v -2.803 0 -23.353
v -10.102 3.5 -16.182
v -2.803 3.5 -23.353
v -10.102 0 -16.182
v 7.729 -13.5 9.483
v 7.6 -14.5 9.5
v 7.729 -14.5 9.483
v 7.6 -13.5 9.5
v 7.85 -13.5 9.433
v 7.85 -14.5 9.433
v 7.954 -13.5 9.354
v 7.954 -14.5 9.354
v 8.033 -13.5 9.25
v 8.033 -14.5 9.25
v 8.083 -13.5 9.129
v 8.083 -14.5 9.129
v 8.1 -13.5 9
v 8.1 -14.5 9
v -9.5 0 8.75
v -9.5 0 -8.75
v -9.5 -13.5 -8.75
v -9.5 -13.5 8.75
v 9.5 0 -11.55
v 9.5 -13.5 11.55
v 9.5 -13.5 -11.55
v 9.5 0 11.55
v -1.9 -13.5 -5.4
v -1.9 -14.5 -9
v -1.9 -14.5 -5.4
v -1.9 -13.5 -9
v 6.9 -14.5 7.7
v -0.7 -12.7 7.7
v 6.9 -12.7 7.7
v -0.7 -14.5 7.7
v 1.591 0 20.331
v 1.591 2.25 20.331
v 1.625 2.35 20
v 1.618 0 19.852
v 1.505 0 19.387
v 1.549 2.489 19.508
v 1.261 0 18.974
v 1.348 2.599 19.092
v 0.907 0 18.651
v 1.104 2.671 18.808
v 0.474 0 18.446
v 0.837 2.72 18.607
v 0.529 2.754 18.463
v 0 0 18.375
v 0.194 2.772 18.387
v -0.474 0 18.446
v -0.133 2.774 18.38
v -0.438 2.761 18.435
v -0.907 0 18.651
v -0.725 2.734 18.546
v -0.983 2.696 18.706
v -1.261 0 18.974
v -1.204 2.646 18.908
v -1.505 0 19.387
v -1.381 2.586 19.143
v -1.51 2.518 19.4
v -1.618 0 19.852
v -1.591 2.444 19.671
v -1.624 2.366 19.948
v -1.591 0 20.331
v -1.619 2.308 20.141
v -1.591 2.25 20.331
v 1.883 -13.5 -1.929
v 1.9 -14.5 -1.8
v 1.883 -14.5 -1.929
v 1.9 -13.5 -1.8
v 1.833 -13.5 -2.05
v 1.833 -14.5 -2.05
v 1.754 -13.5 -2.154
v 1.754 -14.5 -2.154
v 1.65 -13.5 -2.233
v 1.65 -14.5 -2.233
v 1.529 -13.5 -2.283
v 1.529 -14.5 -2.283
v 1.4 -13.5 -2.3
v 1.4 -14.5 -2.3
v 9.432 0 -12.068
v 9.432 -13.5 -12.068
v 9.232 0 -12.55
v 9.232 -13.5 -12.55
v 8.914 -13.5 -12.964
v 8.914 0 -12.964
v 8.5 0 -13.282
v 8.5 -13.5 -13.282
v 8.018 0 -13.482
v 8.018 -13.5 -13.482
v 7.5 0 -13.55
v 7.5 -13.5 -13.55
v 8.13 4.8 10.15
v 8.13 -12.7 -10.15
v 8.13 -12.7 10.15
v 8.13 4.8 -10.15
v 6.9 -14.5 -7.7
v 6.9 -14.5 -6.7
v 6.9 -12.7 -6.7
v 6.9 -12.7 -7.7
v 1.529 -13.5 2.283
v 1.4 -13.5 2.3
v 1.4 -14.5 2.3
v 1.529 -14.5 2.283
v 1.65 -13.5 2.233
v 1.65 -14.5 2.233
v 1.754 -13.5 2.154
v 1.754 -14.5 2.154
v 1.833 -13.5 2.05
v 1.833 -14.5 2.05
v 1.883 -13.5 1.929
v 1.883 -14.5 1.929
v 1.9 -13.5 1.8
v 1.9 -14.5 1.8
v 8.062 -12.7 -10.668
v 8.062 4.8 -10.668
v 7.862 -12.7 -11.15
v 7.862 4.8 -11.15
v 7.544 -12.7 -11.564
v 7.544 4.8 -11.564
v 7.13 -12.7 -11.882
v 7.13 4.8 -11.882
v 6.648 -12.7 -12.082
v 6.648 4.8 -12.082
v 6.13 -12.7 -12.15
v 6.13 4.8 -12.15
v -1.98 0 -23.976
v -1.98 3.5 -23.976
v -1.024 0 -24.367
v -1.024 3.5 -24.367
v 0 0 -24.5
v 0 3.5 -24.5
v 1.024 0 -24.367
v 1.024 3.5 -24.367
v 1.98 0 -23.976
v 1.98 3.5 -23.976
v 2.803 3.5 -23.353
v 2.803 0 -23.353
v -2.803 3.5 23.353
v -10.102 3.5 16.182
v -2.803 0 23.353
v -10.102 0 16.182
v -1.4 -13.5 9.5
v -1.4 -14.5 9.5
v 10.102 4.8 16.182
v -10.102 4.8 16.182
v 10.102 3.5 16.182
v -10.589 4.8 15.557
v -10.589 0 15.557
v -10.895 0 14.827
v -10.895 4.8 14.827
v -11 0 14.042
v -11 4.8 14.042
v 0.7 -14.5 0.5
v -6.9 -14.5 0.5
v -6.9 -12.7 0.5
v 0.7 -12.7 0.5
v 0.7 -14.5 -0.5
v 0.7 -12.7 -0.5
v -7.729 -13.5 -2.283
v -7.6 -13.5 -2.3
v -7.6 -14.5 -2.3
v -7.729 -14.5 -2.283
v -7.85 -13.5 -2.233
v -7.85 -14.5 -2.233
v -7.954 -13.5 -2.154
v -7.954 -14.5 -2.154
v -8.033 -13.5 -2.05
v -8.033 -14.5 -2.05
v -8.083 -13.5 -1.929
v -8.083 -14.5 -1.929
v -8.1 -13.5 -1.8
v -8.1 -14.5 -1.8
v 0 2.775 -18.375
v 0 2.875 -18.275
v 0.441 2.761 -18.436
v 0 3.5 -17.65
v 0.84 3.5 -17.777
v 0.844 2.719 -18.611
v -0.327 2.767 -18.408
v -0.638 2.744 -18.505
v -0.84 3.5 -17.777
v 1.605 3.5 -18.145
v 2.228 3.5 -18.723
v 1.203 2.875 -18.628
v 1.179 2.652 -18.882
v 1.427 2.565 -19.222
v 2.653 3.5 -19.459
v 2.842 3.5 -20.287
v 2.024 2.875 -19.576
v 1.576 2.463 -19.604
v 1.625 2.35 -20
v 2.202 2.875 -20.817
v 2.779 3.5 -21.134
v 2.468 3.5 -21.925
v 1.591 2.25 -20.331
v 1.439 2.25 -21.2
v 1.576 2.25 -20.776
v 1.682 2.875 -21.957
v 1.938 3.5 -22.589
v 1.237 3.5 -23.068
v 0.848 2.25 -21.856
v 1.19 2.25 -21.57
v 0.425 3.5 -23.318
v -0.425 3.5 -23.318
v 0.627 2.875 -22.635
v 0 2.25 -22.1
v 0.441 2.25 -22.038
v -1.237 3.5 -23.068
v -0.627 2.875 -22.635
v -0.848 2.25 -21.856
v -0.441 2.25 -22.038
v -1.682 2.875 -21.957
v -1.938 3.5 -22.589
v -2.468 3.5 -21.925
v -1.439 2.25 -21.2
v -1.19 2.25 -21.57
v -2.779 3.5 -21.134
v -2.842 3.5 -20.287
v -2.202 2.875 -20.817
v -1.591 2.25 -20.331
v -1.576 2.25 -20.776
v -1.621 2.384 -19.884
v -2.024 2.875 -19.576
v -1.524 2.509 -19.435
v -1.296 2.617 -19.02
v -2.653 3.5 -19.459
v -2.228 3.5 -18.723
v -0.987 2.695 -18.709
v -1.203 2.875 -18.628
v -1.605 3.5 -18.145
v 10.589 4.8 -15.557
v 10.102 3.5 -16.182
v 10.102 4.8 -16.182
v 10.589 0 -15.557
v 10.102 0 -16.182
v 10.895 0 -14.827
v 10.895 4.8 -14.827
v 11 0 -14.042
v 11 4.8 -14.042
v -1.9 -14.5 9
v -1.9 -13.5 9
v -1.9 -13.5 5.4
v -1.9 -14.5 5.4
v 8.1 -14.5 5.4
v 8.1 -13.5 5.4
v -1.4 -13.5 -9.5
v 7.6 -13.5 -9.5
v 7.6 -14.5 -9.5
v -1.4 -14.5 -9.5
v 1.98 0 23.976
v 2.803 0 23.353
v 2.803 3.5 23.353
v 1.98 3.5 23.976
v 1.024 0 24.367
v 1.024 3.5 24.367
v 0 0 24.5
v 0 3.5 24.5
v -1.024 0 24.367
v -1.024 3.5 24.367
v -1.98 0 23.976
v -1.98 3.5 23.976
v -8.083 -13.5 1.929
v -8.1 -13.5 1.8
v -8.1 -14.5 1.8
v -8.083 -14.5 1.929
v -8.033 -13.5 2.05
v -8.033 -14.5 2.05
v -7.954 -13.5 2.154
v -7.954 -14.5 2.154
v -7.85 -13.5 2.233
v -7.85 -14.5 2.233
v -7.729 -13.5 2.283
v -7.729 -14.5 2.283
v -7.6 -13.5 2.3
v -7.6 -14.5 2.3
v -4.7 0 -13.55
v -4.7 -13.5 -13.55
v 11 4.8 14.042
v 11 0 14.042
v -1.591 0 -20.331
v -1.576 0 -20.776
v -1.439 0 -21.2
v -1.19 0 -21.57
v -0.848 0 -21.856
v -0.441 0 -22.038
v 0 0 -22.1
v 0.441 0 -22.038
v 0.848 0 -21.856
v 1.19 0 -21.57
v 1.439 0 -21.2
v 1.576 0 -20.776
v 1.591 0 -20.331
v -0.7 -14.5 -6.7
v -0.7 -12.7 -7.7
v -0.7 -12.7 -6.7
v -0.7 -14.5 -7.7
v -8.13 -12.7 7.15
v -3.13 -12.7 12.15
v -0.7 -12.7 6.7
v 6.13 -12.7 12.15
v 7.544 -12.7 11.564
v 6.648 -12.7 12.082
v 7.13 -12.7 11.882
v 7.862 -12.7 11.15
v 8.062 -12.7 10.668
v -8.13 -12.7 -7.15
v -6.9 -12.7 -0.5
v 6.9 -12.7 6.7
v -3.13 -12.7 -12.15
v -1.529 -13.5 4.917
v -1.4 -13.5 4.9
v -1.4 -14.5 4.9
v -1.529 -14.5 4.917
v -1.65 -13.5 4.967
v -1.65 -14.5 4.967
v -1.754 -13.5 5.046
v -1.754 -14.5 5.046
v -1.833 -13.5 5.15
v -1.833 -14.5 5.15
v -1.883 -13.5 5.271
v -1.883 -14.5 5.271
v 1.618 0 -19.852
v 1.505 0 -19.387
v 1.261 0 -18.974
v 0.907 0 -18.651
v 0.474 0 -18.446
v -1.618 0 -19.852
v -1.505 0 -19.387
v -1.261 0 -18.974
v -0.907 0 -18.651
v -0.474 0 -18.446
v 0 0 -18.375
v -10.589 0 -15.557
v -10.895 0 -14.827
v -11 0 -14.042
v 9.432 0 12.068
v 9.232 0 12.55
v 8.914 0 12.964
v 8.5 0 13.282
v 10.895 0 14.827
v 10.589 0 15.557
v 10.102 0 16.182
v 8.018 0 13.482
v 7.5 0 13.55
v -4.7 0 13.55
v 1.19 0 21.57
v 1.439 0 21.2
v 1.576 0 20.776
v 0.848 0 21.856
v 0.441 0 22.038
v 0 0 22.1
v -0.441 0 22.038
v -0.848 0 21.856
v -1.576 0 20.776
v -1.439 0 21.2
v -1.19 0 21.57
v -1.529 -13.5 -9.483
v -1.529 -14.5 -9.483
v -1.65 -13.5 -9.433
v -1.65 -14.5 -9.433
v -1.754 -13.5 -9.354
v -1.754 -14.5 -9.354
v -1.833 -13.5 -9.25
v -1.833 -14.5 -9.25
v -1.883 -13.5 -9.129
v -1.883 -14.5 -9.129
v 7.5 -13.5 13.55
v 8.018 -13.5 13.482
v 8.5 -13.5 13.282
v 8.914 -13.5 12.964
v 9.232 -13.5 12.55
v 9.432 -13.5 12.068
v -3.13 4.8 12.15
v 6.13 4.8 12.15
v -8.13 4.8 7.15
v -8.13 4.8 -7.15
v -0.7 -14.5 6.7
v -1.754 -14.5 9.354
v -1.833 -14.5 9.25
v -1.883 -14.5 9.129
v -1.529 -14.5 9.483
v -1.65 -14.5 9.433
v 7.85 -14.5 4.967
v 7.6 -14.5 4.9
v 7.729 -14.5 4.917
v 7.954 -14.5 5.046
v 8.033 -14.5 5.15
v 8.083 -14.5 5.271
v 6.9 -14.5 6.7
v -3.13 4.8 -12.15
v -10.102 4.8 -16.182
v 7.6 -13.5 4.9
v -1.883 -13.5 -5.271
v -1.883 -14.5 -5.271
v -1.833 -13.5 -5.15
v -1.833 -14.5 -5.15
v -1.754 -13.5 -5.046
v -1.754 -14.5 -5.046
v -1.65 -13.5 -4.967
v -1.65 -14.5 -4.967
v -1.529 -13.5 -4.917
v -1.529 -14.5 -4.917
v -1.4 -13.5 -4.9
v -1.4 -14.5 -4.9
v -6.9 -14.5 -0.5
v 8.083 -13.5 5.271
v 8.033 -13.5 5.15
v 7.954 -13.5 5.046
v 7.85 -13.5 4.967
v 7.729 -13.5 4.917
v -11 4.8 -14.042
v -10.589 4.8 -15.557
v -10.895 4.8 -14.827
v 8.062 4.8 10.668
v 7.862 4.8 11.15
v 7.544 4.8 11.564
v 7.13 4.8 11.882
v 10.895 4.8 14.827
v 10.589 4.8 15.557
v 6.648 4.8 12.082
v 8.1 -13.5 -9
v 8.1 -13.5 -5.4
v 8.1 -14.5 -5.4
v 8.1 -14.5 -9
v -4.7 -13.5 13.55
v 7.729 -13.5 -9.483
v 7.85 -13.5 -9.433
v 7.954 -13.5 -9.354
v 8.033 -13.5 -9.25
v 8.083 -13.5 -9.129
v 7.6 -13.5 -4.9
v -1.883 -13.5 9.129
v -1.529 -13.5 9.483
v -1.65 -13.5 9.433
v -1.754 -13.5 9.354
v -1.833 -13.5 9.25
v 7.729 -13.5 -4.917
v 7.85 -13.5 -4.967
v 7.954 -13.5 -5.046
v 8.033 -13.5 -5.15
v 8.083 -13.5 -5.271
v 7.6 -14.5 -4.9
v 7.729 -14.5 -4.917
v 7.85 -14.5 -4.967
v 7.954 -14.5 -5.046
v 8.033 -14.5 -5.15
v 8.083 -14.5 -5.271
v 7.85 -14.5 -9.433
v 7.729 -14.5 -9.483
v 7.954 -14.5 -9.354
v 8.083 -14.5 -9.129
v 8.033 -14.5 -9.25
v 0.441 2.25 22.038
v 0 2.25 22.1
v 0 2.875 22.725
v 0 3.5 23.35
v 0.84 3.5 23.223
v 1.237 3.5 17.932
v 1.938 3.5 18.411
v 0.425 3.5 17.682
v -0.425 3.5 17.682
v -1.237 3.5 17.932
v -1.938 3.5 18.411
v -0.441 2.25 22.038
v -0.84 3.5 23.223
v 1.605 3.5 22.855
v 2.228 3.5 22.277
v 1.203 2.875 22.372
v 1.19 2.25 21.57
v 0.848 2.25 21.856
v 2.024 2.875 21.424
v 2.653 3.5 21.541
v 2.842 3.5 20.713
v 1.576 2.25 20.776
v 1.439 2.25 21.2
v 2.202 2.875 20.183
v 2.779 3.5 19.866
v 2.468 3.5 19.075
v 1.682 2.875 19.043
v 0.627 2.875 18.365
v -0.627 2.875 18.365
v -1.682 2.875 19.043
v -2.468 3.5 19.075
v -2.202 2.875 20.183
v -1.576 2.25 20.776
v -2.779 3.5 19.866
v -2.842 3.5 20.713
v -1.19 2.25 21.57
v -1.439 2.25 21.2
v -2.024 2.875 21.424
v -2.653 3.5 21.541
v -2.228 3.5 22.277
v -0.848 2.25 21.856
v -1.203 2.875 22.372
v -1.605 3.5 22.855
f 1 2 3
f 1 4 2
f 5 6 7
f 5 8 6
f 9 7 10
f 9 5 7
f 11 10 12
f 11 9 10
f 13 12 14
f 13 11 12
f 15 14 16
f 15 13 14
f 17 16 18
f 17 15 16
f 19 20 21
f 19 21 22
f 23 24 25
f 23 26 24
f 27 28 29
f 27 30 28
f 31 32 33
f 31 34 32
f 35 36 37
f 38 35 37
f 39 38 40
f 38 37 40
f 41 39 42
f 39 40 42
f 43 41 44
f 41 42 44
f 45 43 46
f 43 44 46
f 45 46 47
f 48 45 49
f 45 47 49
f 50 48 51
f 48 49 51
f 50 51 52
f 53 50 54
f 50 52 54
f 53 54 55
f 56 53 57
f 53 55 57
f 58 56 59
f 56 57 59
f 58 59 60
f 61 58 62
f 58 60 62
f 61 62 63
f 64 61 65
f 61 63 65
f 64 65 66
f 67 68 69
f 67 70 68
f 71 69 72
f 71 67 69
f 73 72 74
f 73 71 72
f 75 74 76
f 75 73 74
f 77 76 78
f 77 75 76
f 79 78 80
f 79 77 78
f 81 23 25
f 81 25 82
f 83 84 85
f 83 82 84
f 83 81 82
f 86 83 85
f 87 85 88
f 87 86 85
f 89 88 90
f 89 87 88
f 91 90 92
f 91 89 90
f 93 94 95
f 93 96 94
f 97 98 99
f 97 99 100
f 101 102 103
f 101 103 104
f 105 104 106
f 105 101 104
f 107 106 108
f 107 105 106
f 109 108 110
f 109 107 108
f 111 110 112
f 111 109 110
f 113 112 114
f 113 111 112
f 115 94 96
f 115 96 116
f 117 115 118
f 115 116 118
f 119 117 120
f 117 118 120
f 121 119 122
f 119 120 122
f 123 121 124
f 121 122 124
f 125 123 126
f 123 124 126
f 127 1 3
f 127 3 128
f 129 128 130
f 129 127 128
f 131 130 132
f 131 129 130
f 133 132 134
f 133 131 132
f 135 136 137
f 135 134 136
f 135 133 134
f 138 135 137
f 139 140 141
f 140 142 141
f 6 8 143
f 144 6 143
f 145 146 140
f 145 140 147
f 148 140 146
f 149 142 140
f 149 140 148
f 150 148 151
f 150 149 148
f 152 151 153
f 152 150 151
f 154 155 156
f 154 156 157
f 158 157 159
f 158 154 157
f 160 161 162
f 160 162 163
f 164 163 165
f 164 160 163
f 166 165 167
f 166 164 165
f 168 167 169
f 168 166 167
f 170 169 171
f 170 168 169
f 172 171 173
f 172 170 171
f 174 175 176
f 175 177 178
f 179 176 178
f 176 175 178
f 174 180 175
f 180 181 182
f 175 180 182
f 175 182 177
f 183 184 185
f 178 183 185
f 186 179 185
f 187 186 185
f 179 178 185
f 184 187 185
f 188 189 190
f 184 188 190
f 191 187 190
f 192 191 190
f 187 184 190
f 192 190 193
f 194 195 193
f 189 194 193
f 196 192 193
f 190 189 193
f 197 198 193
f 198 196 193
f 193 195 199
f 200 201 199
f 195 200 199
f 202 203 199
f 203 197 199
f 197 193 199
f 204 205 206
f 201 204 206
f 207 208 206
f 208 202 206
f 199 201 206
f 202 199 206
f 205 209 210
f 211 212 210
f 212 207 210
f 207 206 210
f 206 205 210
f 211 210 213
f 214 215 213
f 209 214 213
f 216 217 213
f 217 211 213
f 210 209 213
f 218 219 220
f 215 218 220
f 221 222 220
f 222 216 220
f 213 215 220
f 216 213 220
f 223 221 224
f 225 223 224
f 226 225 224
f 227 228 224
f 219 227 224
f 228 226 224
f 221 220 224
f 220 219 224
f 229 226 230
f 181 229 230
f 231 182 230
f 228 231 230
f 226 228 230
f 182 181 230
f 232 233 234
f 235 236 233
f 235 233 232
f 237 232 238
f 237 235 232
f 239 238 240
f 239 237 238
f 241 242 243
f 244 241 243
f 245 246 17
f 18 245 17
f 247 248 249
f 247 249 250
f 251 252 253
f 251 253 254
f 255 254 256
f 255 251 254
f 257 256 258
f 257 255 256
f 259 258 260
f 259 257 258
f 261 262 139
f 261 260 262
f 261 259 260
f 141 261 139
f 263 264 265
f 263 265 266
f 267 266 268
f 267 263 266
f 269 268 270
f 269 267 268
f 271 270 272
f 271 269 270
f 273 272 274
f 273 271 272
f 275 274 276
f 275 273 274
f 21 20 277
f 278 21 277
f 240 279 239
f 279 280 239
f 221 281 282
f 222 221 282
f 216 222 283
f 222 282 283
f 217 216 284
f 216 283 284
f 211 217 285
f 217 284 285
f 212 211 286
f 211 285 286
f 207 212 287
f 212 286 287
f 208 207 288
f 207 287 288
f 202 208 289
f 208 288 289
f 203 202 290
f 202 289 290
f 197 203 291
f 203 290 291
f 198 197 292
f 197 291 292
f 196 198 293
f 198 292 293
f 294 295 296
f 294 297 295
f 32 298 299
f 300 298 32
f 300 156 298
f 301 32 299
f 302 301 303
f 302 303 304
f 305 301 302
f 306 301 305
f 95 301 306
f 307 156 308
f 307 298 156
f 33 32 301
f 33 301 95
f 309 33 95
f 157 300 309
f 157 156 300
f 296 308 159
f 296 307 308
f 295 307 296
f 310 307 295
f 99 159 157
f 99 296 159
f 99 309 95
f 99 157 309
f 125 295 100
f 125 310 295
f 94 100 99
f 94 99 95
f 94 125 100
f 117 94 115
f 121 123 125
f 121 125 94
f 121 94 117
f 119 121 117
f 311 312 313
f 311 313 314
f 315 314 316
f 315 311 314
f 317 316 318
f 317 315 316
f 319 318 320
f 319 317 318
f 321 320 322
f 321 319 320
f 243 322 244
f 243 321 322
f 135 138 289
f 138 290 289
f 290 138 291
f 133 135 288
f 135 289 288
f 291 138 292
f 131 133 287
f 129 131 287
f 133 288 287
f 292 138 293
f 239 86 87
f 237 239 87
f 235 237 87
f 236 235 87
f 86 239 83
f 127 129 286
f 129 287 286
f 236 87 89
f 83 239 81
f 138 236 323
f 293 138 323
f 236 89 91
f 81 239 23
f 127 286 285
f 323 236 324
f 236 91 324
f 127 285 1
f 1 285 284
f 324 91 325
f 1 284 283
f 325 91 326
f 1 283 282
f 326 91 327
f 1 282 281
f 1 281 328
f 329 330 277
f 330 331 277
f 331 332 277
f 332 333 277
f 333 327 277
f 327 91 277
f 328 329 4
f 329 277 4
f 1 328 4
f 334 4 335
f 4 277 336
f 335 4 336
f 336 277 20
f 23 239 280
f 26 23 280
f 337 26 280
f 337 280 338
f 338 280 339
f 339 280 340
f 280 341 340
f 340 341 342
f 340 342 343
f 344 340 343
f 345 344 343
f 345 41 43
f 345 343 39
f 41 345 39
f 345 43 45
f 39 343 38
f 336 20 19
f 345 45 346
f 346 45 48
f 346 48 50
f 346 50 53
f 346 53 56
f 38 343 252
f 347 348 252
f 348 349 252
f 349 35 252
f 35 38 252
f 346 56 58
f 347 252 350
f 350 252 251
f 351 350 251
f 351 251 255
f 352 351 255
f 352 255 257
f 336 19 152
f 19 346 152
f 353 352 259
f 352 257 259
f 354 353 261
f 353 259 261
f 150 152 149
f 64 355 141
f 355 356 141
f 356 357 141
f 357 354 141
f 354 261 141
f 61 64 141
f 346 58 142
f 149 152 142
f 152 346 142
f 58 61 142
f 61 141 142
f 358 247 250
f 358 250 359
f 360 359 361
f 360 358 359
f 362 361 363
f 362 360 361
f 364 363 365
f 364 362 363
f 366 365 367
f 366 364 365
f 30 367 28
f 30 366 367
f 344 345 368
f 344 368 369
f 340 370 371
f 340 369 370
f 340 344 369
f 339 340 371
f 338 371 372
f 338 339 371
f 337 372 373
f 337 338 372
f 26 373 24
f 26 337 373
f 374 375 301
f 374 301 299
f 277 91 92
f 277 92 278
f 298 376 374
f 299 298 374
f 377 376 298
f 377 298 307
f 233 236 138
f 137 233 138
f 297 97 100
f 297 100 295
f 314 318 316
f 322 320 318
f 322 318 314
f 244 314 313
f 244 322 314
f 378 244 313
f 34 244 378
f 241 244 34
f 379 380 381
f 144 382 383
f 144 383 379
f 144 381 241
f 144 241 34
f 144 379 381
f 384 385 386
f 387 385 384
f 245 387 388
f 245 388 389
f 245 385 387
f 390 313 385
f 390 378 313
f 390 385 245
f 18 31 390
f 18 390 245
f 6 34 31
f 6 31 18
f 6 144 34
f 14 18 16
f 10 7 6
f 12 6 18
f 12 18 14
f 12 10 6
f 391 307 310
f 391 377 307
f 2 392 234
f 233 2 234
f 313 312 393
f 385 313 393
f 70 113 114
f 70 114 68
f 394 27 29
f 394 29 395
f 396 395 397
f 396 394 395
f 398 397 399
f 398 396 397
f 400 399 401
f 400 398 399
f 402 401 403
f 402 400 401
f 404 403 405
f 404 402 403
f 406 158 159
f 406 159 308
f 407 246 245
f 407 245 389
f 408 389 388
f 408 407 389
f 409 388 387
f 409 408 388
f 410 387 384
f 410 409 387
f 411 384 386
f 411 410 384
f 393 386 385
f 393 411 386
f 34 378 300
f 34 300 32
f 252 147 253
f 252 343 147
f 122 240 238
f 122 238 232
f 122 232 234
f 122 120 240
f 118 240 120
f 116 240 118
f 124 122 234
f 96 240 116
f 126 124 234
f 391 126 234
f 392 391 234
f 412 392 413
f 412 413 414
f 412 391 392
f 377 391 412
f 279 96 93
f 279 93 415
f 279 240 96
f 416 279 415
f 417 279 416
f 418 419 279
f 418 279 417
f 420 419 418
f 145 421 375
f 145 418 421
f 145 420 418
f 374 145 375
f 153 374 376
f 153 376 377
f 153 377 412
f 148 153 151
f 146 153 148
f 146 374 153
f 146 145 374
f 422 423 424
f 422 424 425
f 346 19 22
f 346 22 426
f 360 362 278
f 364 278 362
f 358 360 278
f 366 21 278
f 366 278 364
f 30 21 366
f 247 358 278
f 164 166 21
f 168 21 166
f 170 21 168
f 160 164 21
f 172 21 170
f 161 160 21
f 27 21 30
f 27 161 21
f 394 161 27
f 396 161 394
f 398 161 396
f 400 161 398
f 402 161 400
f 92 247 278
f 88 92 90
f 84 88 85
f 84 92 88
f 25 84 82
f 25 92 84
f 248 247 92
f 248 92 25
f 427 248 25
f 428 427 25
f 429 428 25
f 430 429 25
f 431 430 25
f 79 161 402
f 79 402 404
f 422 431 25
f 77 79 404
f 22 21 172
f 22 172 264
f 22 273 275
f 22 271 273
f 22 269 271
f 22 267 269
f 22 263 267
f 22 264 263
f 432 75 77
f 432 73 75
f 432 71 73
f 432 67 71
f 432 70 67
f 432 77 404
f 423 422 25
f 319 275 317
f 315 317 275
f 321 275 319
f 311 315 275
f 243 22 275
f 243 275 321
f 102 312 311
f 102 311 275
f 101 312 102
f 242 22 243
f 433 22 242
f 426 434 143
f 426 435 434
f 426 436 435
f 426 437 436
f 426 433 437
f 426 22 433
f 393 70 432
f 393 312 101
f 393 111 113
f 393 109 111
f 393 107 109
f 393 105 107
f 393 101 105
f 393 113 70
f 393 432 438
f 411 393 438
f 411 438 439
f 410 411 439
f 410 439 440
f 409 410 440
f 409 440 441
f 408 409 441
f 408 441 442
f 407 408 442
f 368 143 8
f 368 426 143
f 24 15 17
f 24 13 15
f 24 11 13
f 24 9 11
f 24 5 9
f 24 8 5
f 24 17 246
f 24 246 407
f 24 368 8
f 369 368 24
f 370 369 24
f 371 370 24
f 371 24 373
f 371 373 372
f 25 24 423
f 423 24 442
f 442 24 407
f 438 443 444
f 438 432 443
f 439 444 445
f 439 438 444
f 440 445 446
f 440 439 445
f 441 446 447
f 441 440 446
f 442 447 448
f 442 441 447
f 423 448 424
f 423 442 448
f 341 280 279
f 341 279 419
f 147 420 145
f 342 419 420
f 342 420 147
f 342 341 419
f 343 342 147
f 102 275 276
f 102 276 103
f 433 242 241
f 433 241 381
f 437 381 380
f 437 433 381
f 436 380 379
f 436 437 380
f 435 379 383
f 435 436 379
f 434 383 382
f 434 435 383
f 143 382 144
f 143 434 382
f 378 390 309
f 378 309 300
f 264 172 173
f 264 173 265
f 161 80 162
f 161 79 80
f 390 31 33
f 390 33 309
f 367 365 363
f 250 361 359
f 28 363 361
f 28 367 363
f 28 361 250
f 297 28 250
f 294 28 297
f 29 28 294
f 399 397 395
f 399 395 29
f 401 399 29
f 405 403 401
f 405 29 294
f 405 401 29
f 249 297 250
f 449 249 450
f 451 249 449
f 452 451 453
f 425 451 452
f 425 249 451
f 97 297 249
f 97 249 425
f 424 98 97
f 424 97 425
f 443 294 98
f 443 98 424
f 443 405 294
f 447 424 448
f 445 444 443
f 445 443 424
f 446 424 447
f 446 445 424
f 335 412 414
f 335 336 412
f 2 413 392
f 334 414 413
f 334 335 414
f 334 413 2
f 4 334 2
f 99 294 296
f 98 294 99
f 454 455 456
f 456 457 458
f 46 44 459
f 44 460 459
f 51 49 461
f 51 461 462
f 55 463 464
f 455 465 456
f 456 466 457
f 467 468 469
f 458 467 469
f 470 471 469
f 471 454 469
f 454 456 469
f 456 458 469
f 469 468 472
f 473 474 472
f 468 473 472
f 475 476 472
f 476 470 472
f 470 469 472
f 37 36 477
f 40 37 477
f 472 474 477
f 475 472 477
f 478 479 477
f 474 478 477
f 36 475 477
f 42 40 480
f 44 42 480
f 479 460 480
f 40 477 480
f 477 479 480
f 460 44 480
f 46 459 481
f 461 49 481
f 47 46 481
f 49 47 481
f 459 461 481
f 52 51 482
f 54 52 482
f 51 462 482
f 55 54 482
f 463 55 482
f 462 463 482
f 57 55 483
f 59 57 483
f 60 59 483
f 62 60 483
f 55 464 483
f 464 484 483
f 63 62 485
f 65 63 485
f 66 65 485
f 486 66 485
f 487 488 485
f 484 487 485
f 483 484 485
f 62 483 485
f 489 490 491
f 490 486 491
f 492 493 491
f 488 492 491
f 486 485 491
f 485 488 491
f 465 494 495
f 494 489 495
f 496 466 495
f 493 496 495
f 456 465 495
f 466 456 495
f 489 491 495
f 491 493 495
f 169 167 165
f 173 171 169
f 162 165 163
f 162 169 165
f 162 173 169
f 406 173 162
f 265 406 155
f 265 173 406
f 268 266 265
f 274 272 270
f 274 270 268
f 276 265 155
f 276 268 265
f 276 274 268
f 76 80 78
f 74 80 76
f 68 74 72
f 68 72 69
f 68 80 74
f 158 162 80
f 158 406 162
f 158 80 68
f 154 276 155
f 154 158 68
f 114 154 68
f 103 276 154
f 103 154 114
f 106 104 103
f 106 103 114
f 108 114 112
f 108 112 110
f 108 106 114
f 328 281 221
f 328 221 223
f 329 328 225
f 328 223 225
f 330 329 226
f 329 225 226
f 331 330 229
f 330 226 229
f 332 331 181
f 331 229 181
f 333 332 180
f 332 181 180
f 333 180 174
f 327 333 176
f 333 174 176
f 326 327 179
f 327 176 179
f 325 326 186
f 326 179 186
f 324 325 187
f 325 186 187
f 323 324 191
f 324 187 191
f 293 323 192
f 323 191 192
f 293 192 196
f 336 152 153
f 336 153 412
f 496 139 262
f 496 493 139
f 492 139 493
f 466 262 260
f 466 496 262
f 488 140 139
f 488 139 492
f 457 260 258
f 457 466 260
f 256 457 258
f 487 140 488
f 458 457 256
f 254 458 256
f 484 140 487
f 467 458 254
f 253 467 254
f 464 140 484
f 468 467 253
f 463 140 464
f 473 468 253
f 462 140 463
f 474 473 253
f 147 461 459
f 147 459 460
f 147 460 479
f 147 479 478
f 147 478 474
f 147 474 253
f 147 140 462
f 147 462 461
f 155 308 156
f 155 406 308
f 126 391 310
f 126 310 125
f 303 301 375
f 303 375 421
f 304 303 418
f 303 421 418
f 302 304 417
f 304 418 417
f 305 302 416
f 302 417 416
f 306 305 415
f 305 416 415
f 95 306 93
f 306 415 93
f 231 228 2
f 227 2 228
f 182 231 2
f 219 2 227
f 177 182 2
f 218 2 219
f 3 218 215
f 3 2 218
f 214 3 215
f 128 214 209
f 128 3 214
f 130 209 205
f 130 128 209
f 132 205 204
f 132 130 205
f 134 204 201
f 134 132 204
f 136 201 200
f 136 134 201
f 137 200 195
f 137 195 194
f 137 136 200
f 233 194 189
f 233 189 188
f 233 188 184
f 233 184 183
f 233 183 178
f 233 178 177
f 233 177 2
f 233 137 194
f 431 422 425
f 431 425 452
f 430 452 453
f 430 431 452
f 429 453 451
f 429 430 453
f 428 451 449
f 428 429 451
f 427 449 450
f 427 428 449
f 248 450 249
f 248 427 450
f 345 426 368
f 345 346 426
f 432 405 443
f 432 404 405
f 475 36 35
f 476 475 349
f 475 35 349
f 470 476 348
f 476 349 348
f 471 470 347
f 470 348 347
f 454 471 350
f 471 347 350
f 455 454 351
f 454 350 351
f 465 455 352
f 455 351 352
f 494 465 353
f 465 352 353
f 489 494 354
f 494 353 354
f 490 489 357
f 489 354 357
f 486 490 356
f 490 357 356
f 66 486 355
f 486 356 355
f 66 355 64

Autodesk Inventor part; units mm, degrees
ref_plane "YZ Plane" through (0, 0, 0) normal (1, 0, 0) x (0, 1, 0)
ref_plane "XZ Plane" through (0, 0, 0) normal (0, 1, 0) x (-1, 0, 0)
ref_plane "XY Plane" through (0, 0, 0) normal (0, 0, 1) x (1, 0, 0)
sketch "Sketch1" plane through (0, 0, 0) normal (0, 1, 0) x (-1, 0, 0)
  arc A0 (2.8034, 23.3533) -> (-2.8034, 23.3533) centre (0, 20.5) ccw
  line L0 (-11, 14.0418) -> (-11, 0)
  line L1 (11, 14.0418) -> (11, 0)
  line L2 (11, 0) -> (-11, 0)
  line L3 (10.1025, 16.1818) -> (2.8034, 23.3533)
  line L4 (-10.1025, 16.1818) -> (-2.8034, 23.3533)
  arc A1 (11, 14.0418) -> (10.1025, 16.1818) centre (8, 14.0418) ccw
  arc A2 (-10.1025, 16.1818) -> (-11, 14.0418) centre (-8, 14.0418) ccw
  arc A3 (-2.8034, -23.3533) -> (2.8034, -23.3533) centre (0, -20.5) ccw
  line L5 (-11, -14.0418) -> (-11, 0)
  line L6 (11, -14.0418) -> (11, 0)
  line L7 (10.1025, -16.1818) -> (2.8034, -23.3533)
  line L8 (-10.1025, -16.1818) -> (-2.8034, -23.3533)
  arc A4 (10.1025, -16.1818) -> (11, -14.0418) centre (8, -14.0418) ccw
  arc A5 (-11, -14.0418) -> (-10.1025, -16.1818) centre (-8, -14.0418) ccw
  point P0 (0, 0)
  point P1 (11, 15.3)
  point P2 (-11, 15.3)
  point P3 (11, -15.3)
  point P4 (-11, -15.3)
  dimension "d0" = 0
  dimension "d1" = 22
  dimension "d2" = 11
  dimension "d3" = 8
  dimension "d4" = 15.3
  dimension "d5" = 0
  dimension "d6" = 15.3
  dimension "d7" = 20.5
  dimension "d8" = 3
extrude "Extrusion1" add sketch "Sketch1" along normal blind 4.8
sketch "Sketch2" plane through (0, 4.8, 0) normal (0, 1, 0) x (1, 0, 0)
  line L0 (-10.1025, -16.1818) -> (-2.8034, -23.3533) projected
  line L1 (2.8034, -23.3533) -> (10.1025, -16.1818) projected
  line L2 (-10.1025, -16.1818) -> (10.1025, -16.1818)
  line L3 (-2.8034, 23.3533) -> (-10.1025, 16.1818) projected
  line L4 (10.1025, 16.1818) -> (2.8034, 23.3533) projected
  line L5 (-10.1025, 16.1818) -> (10.1025, 16.1818)
  arc A0 (-2.8034, -23.3533) -> (2.8034, -23.3533) centre (0, -20.5) ccw projected
  arc A1 (2.8034, 23.3533) -> (-2.8034, 23.3533) centre (0, 20.5) ccw projected
  point P0 (0, 0)
extrude "Extrusion2" cut sketch "Sketch2" against normal blind 1.3
sketch "Sketch3" plane through (0, 3.5, 0) normal (0, 1, 0) x (1, 0, 0)
  arc A0 (-2.8034, -23.3533) -> (2.8034, -23.3533) centre (0, -20.5) ccw projected
  point P0 (0, 0)
  point P1 (0, 20.5)
hole "Hole1" at (0, 3.5, 20.5) at (0, 3.5, -20.5) direction (0, -1, 0) diameter 3.2 depth 8 tip angle 118 countersink diameter 5.7 countersink angle 90
sketch "Sketch5" plane through (0, 0, 0) normal (0, -1, 0) x (1, 0, 0)
  line L0 (7.5, -13.55) -> (-4.7, -13.55)
  line L1 (-9.5, -8.75) -> (-9.5, 8.75)
  line L2 (-4.7, 13.55) -> (7.5, 13.55)
  line L3 (9.5, 11.55) -> (9.5, -11.55)
  line L4 (9.5, -13.55) -> (-9.5, 13.55) construction
  line L5 (-9.5, -13.55) -> (9.5, 13.55) construction
  line L6 (-9.5, -8.75) -> (-4.7, -13.55)
  line L7 (-9.5, 8.75) -> (-4.7, 13.55)
  arc A0 (7.5, -13.55) -> (9.5, -11.55) centre (7.5, -11.55) ccw
  arc A1 (9.5, 11.55) -> (7.5, 13.55) centre (7.5, 11.55) ccw
  point P0 (0, 0)
  dimension "d20" = 4.8
  dimension "d21" = 4.8
  dimension "d22" = 4.8
  dimension "d23" = 4.8
  dimension "d24" = 19
  dimension "d25" = 2
  dimension "d26" = 27.1
extrude "Extrusion3" add sketch "Sketch5" along normal blind 13.5
sketch "Sketch6" plane through (0, 4.8, 0) normal (0, 1, 0) x (1, 0, 0)
  line L0 (6.13, -12.15) -> (-3.13, -12.15)
  line L1 (-8.13, -7.15) -> (-8.13, 7.15)
  line L2 (-3.13, 12.15) -> (6.13, 12.15)
  line L3 (8.13, 10.15) -> (8.13, -10.15)
  line L4 (8.13, -12.15) -> (-8.13, 12.15) construction
  line L5 (-8.13, -12.15) -> (8.13, 12.15) construction
  arc A0 (6.13, -12.15) -> (8.13, -10.15) centre (6.13, -10.15) ccw
  arc A1 (8.13, 10.15) -> (6.13, 12.15) centre (6.13, 10.15) ccw
  line L6 (-8.13, -7.15) -> (-3.13, -12.15)
  line L7 (-8.13, 7.15) -> (-3.13, 12.15)
  point P0 (0, 0)
  dimension "d29" = 2
  dimension "d30" = 24.3
  dimension "d31" = 16.26
  dimension "d32" = 5
  dimension "d33" = 45
  dimension "d34" = 5
  dimension "d35" = 45
extrude "Extrusion4" cut sketch "Sketch6" against normal blind 17.5
sketch "Sketch7" plane through (0, -13.5, 0) normal (0, -1, 0) x (1, 0, 0)
  line L0 (1.4, -2.3) -> (-7.6, -2.3)
  line L1 (-8.1, -1.8) -> (-8.1, 1.8)
  line L2 (-7.6, 2.3) -> (1.4, 2.3)
  line L3 (1.9, 1.8) -> (1.9, -1.8)
  line L4 (1.9, -2.3) -> (-8.1, 2.3) construction
  line L5 (-8.1, -2.3) -> (1.9, 2.3) construction
  line L6 (7.6, -9.5) -> (-1.4, -9.5)
  line L7 (-1.9, -9) -> (-1.9, -5.4)
  line L8 (-1.4, -4.9) -> (7.6, -4.9)
  line L9 (8.1, -5.4) -> (8.1, -9)
  line L10 (8.1, -9.5) -> (-1.9, -4.9) construction
  line L11 (-1.9, -9.5) -> (8.1, -4.9) construction
  line L12 (-9.5, -8.75) -> (-4.7, -13.55) projected
  line L13 (-4.7, -13.55) -> (7.5, -13.55) projected
  arc A0 (7.5, -13.55) -> (9.5, -11.55) centre (7.5, -11.55) ccw projected
  line L14 (9.5, -11.55) -> (9.5, 11.55) projected
  arc A1 (9.5, 11.55) -> (7.5, 13.55) centre (7.5, 11.55) ccw projected
  line L15 (7.5, 13.55) -> (-4.7, 13.55) projected
  line L16 (-4.7, 13.55) -> (-9.5, 8.75) projected
  line L17 (-9.5, 8.75) -> (-9.5, -8.75) projected
  line L18 (-9.5, 0) -> (9.5, 0)
  arc A2 (-8.1, -1.8) -> (-7.6, -2.3) centre (-7.6, -1.8) ccw
  arc A3 (-7.6, 2.3) -> (-8.1, 1.8) centre (-7.6, 1.8) ccw
  arc A4 (1.9, 1.8) -> (1.4, 2.3) centre (1.4, 1.8) ccw
  arc A5 (1.4, -2.3) -> (1.9, -1.8) centre (1.4, -1.8) ccw
  arc A6 (-1.4, -4.9) -> (-1.9, -5.4) centre (-1.4, -5.4) ccw
  arc A7 (8.1, -5.4) -> (7.6, -4.9) centre (7.6, -5.4) ccw
  arc A8 (7.6, -9.5) -> (8.1, -9) centre (7.6, -9) ccw
  arc A9 (-1.9, -9) -> (-1.4, -9.5) centre (-1.4, -9) ccw
  line L19 (7.6, 9.5) -> (-1.4, 9.5)
  line L20 (-1.9, 9) -> (-1.9, 5.4)
  line L21 (-1.4, 4.9) -> (7.6, 4.9)
  line L22 (8.1, 5.4) -> (8.1, 9)
  line L23 (8.1, 9.5) -> (-1.9, 4.9) construction
  line L24 (-1.9, 9.5) -> (8.1, 4.9) construction
  arc A10 (-1.9, 5.4) -> (-1.4, 4.9) centre (-1.4, 5.4) ccw
  arc A11 (7.6, 4.9) -> (8.1, 5.4) centre (7.6, 5.4) ccw
  arc A12 (8.1, 9) -> (7.6, 9.5) centre (7.6, 9) ccw
  arc A13 (-1.4, 9.5) -> (-1.9, 9) centre (-1.4, 9) ccw
  point P0 (0, 0)
  point P1 (-3.1, 0)
  point P2 (3.1, -7.2)
  point P3 (3.1, 7.2)
  dimension "d38" = 10
  dimension "d39" = 4.6
  dimension "d40" = 2.6
  dimension "d41" = 10
  dimension "d42" = 4.6
  dimension "d43" = 0.5
  dimension "d44" = 1.4
  dimension "d45" = 1.4
extrude "Extrusion5" add sketch "Sketch7" along normal blind 1 contours L0 A2 L1 L18 L3 A5 | L18 L1 A3 L2 A4 L3 | L6 A9 L7 A6 L8 A7 L9 A8 | A12 L22 A11 L21 A10 L20 A13 L19
sketch "Sketch8" plane through (0, -14.5, 0) normal (0, -1, 0) x (1, 0, 0)
  line L0 (-7.6, -2.3) -> (1.4, -2.3) projected
  arc A0 (1.4, -2.3) -> (1.9, -1.8) centre (1.4, -1.8) ccw projected
  line L1 (1.9, -1.8) -> (1.9, 1.8) projected
  arc A1 (1.9, 1.8) -> (1.4, 2.3) centre (1.4, 1.8) ccw projected
  line L2 (1.4, 2.3) -> (-7.6, 2.3) projected
  arc A2 (-7.6, 2.3) -> (-8.1, 1.8) centre (-7.6, 1.8) ccw projected
  line L3 (-8.1, 1.8) -> (-8.1, -1.8) projected
  arc A3 (-8.1, -1.8) -> (-7.6, -2.3) centre (-7.6, -1.8) ccw projected
  line L4 (7.6, -4.9) -> (-1.4, -4.9) projected
  arc A4 (-1.4, -4.9) -> (-1.9, -5.4) centre (-1.4, -5.4) ccw projected
  line L5 (-1.9, -5.4) -> (-1.9, -9) projected
  arc A5 (-1.9, -9) -> (-1.4, -9.5) centre (-1.4, -9) ccw projected
  line L6 (-1.4, -9.5) -> (7.6, -9.5) projected
  arc A6 (7.6, -9.5) -> (8.1, -9) centre (7.6, -9) ccw projected
  line L7 (8.1, -9) -> (8.1, -5.4) projected
  arc A7 (8.1, -5.4) -> (7.6, -4.9) centre (7.6, -5.4) ccw projected
  line L8 (-1.9, 9) -> (-1.9, 5.4) projected
  arc A8 (-1.9, 5.4) -> (-1.4, 4.9) centre (-1.4, 5.4) ccw projected
  line L9 (-1.4, 4.9) -> (7.6, 4.9) projected
  arc A9 (7.6, 4.9) -> (8.1, 5.4) centre (7.6, 5.4) ccw projected
  line L10 (8.1, 5.4) -> (8.1, 9) projected
  arc A10 (8.1, 9) -> (7.6, 9.5) centre (7.6, 9) ccw projected
  line L11 (7.6, 9.5) -> (-1.4, 9.5) projected
  arc A11 (-1.4, 9.5) -> (-1.9, 9) centre (-1.4, 9) ccw projected
  line L12 (-8.1, 1.8) -> (-8.1, -1.8) projected
  line L13 (-8.1, 0) -> (1.9, 0)
  line L14 (-7.6, -2.3) -> (1.4, -2.3) projected
  line L15 (-3.1, -2.3) -> (-3.1, 2.3)
  line L16 (-1.9, -5.4) -> (-1.9, -9) projected
  line L17 (-1.9, -7.2) -> (8.1, -7.2)
  line L18 (7.6, -9.5) -> (-1.4, -9.5) projected
  line L19 (3.1, -9.5) -> (3.1, -4.9)
  line L20 (7.6, -4.9) -> (-1.4, -4.9) projected
  line L21 (3.1, 4.9) -> (3.1, 9.5)
  line L22 (-1.9, 9) -> (-1.9, 5.4) projected
  line L23 (-1.9, 7.2) -> (8.1, 7.2)
  line L24 (6.9, -7.7) -> (-0.7, -7.7)
  line L25 (-0.7, -7.7) -> (-0.7, -6.7)
  line L26 (-0.7, -6.7) -> (6.9, -6.7)
  line L27 (6.9, -6.7) -> (6.9, -7.7)
  line L28 (6.9, -7.7) -> (-0.7, -6.7) construction
  line L29 (-0.7, -7.7) -> (6.9, -6.7) construction
  line L30 (0.7, -0.5) -> (-6.9, -0.5)
  line L31 (-6.9, -0.5) -> (-6.9, 0.5)
  line L32 (-6.9, 0.5) -> (0.7, 0.5)
  line L33 (0.7, 0.5) -> (0.7, -0.5)
  line L34 (0.7, -0.5) -> (-6.9, 0.5) construction
  line L35 (-6.9, -0.5) -> (0.7, 0.5) construction
  line L36 (6.9, 6.7) -> (-0.7, 6.7)
  line L37 (-0.7, 6.7) -> (-0.7, 7.7)
  line L38 (-0.7, 7.7) -> (6.9, 7.7)
  line L39 (6.9, 7.7) -> (6.9, 6.7)
  line L40 (6.9, 6.7) -> (-0.7, 7.7) construction
  line L41 (-0.7, 6.7) -> (6.9, 7.7) construction
  point P0 (0, 0)
  point P1 (3.1, -7.2)
  point P2 (-3.1, 0)
  point P3 (3.1, 7.2)
  dimension "d48" = 7.6
  dimension "d49" = 7.6
  dimension "d50" = 7.6
  dimension "d52" = 1
  dimension "d53" = 1
  dimension "d54" = 1
extrude "Extrusion6" cut sketch "Sketch8" against normal through all contours L30 L31 L13 L15 | L15 L13 L33 L30 | L15 L32 L33 L13 | L13 L31 L32 L15 | L26 L27 L17 L19 | L19 L17 L25 L26 | L19 L24 L25 L17 | L17 L27 L24 L19 | L37 L38 L21 L23 | L23 L21 L36 L37 | L23 L39 L36 L21 | L21 L38 L39 L23
sketch "Sketch9" plane through (0, 3.5, 0) normal (0, 1, 0) x (1, 0, 0)
  circle A0 centre (0, 20.5) radius 1.6 projected
  circle A1 centre (0, 20.5) radius 0.2629
  circle A2 centre (0, 20) radius 1.625
  line L0 (0, 20) -> (0, -20)
  circle A3 centre (0, -20) radius 1.625
  point P0 (0, 0)
  point P1 (-1.591, 20.3306)
  point P2 (1.591, 20.3306)
  dimension "d57" = 3.25
  dimension "d58" = 0.5
  dimension "d61" = 40
  dimension "d62" = 3.25
extrude "Extrusion7" cut sketch "Sketch9" against normal blind 10 contours A3 | A0 L0 A2 | A2 L0 A0
equation "\"d2\" = 0.5 * d1"
equation "\"d6\" = d4"
equation "\"d21\" = d20"
equation "\"d22\" = d20"
equation "\"d23\" = d22"
equation "\"d34\" = d32"
equation "\"d35\" = d33"
equation "\"d42\" = d39"
equation "\"d49\" = d48"
equation "\"d50\" = d48"
equation "\"d53\" = d52"
equation "\"d54\" = d52"
properties part number "PlugFemeaTomada" material "Plastic, Opaque Black"
